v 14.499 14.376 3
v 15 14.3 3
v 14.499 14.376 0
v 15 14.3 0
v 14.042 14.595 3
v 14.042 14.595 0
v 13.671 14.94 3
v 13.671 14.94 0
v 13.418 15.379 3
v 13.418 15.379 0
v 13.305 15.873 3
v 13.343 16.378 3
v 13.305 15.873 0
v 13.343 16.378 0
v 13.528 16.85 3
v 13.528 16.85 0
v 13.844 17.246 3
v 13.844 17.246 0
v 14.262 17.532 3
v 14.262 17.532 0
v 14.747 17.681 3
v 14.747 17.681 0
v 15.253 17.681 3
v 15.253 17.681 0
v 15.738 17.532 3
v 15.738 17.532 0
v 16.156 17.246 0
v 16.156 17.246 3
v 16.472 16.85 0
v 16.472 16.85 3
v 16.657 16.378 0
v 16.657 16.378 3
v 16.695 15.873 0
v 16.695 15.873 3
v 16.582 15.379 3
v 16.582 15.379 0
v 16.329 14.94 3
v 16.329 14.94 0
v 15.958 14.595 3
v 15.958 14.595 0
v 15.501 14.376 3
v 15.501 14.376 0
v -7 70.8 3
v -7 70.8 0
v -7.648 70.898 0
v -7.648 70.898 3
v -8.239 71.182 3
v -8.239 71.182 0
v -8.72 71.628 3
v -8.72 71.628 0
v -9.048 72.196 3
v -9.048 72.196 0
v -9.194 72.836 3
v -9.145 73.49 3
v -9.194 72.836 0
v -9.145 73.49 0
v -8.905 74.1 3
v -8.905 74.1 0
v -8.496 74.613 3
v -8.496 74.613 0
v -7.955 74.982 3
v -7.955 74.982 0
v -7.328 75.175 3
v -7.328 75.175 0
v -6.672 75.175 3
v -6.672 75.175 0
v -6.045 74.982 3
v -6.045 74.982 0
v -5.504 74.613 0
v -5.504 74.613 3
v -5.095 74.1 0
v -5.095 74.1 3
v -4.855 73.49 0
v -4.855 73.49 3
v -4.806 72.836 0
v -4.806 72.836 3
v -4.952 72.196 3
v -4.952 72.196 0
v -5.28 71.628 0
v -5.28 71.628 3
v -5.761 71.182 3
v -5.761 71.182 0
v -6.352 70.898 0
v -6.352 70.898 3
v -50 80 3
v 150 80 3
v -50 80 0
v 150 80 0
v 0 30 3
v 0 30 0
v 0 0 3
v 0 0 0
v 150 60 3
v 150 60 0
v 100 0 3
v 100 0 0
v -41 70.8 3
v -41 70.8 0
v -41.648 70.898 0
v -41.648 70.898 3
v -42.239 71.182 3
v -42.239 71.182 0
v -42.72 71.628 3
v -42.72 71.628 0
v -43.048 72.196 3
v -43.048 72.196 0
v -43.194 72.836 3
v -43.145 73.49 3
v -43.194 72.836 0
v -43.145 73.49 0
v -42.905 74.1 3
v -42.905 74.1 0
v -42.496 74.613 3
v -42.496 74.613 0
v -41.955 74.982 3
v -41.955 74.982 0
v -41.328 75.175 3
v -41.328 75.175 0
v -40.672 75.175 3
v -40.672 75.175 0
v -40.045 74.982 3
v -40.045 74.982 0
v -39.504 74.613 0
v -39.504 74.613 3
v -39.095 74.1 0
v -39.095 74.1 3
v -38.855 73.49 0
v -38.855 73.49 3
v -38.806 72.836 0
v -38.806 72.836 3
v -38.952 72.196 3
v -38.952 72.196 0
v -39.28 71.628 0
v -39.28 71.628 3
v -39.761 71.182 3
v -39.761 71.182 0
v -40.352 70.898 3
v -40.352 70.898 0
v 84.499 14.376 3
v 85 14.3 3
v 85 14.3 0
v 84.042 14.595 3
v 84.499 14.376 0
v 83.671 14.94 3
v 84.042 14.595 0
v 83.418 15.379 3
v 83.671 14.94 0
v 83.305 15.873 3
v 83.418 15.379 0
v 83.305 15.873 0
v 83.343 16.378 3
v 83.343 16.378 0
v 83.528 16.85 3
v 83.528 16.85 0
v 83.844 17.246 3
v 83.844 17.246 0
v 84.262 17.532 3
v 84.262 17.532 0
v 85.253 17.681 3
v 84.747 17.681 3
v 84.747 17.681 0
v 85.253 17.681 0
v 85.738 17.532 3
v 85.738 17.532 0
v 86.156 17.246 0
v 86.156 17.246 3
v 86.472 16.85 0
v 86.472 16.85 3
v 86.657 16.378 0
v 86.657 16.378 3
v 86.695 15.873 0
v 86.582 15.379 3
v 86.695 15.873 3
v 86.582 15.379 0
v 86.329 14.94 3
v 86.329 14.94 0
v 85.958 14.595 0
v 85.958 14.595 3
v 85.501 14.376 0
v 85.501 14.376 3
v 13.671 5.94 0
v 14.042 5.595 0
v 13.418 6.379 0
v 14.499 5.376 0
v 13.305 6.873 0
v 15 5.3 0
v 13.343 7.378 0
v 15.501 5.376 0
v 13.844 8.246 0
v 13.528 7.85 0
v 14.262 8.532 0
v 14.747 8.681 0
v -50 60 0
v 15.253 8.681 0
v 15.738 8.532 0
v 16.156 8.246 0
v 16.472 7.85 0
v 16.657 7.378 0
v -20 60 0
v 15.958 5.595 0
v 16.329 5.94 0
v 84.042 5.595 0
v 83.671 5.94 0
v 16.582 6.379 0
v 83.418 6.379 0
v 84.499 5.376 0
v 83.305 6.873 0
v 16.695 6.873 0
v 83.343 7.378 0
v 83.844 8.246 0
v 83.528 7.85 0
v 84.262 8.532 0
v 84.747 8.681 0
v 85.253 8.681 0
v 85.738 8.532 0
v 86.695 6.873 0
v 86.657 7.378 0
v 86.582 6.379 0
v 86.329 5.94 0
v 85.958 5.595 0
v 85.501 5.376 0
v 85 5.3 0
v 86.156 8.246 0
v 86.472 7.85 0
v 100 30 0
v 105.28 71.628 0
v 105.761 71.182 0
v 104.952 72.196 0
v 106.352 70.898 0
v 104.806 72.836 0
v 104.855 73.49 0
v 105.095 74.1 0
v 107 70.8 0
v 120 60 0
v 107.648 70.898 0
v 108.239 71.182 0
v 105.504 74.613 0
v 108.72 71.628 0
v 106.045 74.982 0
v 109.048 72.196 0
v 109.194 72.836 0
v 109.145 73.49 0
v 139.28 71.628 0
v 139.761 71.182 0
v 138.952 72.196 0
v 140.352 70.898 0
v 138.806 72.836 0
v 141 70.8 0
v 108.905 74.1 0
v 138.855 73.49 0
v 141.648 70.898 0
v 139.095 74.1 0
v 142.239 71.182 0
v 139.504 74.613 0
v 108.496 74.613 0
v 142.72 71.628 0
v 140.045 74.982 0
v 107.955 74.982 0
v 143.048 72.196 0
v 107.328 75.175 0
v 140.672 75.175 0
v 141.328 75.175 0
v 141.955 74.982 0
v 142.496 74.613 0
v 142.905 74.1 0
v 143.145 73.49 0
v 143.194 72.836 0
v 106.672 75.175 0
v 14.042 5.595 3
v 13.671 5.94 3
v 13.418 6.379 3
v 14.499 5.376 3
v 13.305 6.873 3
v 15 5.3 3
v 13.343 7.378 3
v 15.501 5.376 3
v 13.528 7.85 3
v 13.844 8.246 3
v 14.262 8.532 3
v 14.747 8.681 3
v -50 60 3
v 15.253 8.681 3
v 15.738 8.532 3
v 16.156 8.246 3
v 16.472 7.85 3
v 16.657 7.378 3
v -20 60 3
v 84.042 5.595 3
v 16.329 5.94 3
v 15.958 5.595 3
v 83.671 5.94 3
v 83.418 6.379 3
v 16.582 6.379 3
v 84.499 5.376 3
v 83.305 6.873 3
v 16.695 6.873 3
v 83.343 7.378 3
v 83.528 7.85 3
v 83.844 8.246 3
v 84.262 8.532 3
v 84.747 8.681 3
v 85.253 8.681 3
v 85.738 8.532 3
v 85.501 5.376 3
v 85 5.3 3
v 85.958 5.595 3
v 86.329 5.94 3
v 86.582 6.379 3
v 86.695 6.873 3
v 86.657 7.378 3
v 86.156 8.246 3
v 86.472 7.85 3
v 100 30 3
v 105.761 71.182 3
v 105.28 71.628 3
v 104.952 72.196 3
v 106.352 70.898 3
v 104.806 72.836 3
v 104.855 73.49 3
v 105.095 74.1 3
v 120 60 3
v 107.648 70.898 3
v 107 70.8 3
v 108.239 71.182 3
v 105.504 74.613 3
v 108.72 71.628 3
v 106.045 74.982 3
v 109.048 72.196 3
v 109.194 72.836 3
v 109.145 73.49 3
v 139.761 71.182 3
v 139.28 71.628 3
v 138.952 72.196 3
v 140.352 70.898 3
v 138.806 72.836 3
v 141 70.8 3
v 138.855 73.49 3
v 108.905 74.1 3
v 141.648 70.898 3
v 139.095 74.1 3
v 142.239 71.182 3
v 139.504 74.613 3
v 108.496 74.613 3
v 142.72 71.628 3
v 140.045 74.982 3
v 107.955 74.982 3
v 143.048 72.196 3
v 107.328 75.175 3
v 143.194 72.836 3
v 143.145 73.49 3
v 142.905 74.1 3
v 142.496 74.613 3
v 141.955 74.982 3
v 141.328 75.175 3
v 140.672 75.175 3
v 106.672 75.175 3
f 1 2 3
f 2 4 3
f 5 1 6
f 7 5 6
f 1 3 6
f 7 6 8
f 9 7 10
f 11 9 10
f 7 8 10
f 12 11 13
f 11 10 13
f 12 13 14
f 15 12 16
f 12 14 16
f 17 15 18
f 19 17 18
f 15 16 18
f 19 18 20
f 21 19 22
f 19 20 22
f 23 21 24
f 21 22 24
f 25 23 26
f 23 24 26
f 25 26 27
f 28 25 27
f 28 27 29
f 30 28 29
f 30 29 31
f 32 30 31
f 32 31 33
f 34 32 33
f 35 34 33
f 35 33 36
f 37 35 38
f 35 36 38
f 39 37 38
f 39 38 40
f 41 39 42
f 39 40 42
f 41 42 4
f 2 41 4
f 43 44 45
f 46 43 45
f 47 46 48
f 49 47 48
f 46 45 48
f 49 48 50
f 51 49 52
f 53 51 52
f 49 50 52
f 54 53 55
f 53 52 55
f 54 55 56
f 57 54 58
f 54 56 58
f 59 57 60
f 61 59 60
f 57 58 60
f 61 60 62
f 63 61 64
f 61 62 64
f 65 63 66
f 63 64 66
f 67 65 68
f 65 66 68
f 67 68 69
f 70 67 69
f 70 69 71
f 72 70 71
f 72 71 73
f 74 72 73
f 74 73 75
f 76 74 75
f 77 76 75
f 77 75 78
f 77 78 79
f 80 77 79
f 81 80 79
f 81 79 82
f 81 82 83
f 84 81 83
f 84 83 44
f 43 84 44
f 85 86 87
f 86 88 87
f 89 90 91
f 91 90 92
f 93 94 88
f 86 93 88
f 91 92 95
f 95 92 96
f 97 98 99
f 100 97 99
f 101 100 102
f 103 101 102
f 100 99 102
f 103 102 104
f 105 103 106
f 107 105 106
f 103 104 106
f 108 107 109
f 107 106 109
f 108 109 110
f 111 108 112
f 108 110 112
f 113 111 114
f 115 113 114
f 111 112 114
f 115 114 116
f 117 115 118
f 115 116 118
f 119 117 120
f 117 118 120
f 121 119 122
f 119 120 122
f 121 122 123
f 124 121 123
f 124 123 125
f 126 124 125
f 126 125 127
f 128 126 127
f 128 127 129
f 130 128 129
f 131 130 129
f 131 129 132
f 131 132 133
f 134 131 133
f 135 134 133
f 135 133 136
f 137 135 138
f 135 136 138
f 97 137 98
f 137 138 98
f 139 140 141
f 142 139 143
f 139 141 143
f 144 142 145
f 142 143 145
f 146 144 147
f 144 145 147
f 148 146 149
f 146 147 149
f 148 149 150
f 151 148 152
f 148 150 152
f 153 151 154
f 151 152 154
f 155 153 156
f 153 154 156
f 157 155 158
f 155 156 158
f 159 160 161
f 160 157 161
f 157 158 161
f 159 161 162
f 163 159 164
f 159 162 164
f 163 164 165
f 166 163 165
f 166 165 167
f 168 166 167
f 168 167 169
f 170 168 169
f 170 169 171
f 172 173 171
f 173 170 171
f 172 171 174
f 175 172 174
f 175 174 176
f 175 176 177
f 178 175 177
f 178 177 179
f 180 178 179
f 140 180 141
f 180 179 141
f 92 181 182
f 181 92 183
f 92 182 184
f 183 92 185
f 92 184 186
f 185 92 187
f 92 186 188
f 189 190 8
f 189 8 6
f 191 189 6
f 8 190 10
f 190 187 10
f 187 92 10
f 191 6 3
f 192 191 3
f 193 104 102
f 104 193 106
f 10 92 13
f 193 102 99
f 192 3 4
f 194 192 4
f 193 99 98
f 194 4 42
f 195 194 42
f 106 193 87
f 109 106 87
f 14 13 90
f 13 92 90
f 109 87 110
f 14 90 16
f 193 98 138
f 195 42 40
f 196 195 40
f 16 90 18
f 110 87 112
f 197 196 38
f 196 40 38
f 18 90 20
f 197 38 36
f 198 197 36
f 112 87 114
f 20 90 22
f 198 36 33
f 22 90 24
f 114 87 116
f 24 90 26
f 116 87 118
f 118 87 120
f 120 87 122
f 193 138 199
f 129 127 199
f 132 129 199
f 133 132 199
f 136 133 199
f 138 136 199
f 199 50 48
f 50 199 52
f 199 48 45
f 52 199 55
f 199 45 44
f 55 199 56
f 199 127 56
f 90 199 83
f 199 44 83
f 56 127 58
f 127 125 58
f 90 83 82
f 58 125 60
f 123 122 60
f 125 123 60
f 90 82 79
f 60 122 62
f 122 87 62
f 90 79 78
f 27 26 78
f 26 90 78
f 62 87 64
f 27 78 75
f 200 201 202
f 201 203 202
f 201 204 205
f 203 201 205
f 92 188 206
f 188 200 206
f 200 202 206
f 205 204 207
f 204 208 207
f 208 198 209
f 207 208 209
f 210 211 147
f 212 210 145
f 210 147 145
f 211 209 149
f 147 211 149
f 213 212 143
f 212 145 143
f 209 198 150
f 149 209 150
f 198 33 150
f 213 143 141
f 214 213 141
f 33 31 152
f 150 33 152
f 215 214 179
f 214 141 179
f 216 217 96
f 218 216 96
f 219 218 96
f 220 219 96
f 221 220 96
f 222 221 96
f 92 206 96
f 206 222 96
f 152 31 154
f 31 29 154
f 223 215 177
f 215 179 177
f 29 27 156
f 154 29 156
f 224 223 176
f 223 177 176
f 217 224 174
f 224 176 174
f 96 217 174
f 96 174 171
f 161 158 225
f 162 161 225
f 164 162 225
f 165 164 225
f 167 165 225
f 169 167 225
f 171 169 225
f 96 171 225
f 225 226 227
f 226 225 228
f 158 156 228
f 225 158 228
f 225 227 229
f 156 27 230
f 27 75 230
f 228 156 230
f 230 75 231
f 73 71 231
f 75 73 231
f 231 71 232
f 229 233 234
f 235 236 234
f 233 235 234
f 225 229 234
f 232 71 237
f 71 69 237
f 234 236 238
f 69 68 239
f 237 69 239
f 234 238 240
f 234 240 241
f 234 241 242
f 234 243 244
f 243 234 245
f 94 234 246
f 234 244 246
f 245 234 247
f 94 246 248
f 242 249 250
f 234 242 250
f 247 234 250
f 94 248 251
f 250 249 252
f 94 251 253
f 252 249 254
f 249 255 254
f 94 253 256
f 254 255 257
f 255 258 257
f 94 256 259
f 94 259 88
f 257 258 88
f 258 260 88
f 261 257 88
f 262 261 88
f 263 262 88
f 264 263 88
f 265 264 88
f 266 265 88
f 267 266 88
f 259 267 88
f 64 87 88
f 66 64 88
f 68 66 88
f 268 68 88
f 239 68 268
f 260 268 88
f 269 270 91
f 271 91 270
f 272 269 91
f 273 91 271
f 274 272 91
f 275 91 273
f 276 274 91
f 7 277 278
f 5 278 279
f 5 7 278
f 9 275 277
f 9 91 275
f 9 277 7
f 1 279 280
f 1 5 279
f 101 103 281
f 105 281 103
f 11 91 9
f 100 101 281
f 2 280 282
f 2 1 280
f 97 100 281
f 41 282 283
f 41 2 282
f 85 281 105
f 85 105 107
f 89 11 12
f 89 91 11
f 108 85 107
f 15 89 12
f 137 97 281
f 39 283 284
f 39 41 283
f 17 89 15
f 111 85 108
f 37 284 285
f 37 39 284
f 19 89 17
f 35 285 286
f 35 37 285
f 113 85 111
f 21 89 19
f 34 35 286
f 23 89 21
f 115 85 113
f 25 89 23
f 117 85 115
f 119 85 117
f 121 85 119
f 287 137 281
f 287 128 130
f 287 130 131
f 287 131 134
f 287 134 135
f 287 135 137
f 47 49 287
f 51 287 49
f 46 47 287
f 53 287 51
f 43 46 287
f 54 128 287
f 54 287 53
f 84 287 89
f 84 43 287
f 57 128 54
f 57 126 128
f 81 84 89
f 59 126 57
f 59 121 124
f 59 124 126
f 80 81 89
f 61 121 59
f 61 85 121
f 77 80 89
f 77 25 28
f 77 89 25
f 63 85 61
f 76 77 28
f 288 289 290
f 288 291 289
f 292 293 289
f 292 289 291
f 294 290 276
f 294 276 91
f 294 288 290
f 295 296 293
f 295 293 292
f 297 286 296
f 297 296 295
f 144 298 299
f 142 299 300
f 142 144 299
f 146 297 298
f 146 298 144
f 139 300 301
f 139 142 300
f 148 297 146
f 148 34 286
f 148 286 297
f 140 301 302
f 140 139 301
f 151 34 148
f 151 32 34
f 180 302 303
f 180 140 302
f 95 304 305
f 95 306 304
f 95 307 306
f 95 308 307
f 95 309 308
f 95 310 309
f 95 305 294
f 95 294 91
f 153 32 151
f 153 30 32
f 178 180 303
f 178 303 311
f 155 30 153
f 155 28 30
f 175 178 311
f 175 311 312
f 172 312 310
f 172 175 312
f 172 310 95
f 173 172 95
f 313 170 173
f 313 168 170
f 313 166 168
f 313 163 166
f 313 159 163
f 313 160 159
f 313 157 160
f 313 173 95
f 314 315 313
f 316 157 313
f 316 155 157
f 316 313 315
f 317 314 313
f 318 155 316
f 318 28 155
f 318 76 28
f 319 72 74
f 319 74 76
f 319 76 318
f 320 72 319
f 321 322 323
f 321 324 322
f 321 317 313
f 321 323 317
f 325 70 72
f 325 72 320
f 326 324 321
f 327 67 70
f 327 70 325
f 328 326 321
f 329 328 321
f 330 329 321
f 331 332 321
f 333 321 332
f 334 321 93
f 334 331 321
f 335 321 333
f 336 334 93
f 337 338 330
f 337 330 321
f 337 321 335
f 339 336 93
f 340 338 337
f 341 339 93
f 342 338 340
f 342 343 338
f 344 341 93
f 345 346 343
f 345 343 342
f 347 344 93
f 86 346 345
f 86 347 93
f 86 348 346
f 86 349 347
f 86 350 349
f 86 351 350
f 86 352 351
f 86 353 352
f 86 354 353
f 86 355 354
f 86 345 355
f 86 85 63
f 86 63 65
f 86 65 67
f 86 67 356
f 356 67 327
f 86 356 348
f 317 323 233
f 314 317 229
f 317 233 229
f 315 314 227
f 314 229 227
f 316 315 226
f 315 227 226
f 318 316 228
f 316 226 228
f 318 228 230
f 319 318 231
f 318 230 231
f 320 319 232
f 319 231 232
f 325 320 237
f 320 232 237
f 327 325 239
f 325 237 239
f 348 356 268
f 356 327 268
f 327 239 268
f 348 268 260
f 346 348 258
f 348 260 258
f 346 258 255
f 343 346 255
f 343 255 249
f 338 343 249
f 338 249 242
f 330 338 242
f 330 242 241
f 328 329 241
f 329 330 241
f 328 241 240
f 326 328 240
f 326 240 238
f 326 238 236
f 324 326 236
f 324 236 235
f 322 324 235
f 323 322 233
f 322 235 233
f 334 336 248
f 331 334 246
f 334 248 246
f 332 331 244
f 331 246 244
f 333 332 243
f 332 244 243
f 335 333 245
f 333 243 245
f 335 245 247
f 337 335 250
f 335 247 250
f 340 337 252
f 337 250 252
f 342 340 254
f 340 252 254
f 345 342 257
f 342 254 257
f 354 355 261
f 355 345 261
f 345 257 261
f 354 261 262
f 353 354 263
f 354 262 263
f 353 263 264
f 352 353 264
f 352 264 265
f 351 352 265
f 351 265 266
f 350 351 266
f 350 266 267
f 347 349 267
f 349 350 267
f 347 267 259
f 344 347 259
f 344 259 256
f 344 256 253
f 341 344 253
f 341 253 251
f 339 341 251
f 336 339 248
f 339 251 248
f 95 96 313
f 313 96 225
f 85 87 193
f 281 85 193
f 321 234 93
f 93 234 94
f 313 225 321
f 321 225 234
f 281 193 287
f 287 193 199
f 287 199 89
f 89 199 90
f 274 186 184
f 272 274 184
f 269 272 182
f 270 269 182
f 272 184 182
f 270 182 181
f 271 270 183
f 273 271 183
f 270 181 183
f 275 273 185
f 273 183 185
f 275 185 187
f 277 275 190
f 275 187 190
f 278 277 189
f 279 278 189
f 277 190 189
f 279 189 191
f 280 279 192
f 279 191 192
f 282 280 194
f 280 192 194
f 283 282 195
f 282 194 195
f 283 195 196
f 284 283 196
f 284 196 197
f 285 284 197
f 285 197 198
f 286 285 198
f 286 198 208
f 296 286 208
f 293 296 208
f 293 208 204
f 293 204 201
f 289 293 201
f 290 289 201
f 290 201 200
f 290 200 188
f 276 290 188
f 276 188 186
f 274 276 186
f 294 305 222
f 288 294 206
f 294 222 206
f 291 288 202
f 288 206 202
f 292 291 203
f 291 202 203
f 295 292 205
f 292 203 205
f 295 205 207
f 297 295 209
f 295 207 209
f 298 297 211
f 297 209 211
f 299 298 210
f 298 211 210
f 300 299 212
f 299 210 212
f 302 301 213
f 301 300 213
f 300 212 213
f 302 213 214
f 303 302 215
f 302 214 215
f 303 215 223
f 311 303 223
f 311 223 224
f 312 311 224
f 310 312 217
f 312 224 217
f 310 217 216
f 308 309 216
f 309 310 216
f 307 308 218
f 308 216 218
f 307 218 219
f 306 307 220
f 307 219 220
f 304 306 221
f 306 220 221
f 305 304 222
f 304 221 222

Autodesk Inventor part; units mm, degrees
ref_plane "YZ Plane" through (0, 0, 0) normal (1, 0, 0) x (0, 1, 0)
ref_plane "XZ Plane" through (0, 0, 0) normal (0, 1, 0) x (-1, 0, 0)
ref_plane "XY Plane" through (0, 0, 0) normal (0, 0, 1) x (1, 0, 0)
sketch "Sketch1" plane through (0, 0, 0) normal (0, 1, 0) x (-1, 0, 0)
  point P0 (0, 0)
sketch "Sketch2" plane through (0, 0, 0) normal (0, 0, 1) x (1, 0, 0)
  line L0 (0, 0) -> (100, 0)
  line L1 (100, 0) -> (100, 30)
  line L2 (100, 30) -> (120, 60)
  line L3 (120, 60) -> (150, 60)
  line L4 (150, 60) -> (150, 80)
  line L5 (150, 80) -> (-50, 80)
  line L6 (-50, 80) -> (-50, 60)
  line L7 (0, 30) -> (0, 0)
  line L8 (-50, 60) -> (-20, 60)
  line L9 (-20, 60) -> (0, 30)
  dimension "d0" = 100
  dimension "d1" = 200
  dimension "d2" = 0
  dimension "d3" = 20
  dimension "d4" = 30
  dimension "d5" = 30
  dimension "d6" = 20
  dimension "d7" = 30
  dimension "d8" = 30
  dimension "d9" = 20
  dimension "d10" = 20
sketch "Sketch3" plane through (0, 0, 0) normal (0, 0, 1) x (1, 0, 0)
  point P0 (0, 0)
sketch "Sketch4" plane through (0, 0, 0) normal (0, 0, 1) x (1, 0, 0)
  point P0 (0, 0)
extrude "Extrusion1" add sketch "Sketch2" along normal blind 3
sketch "Sketch6" plane through (0, 0, 3) normal (0, 0, 1) x (1, 0, 0)
  point P0 (0, 0)
sketch "Sketch7" plane through (0, 0, 0) normal (0, 0, -1) x (-1, 0, 0)
  point P0 (0, 0)
sketch "Sketch8" plane through (0, 0, 3) normal (0, 0, 1) x (1, 0, 0)
  point P0 (0, 0)
sketch "Sketch9" plane through (0, 0, 3) normal (0, 0, 1) x (1, 0, 0)
  line L0 (-50, 80) -> (-50, 60) projected
  line L1 (150, 80) -> (-50, 80) projected
  line L2 (0, 30) -> (0, 0) projected
  line L3 (0, 0) -> (100, 0) projected
  point P0 (15, 16)
  point P1 (15, 7)
  dimension "d37" = 15
  dimension "d38" = 15
  dimension "d39" = 7
  dimension "d40" = 9
hole "Hole2" at (15, 7, 3) at (15, 16, 3) direction (0, 0, -1) diameter 3.4 end through all
sketch "Sketch11" plane through (0, 0, 3) normal (0, 0, 1) x (1, 0, 0)
  line L0 (100, 0) -> (100, 30) projected
  point P0 (0, 0)
sketch "Sketch12" plane through (0, 0, 3) normal (0, 0, 1) x (1, 0, 0)
  line L0 (-50, 80) -> (-50, 60) projected
  line L1 (150, 80) -> (-50, 80) projected
  point P0 (0, 0)
  point P1 (-41, 73)
  point P2 (-7, 73)
  dimension "d50" = 9
  dimension "d51" = 34
  dimension "d52" = 7
  dimension "d53" = 7
hole "Hole3" at (-41, 73, 3) at (-7, 73, 3) direction (0, 0, -1) diameter 4.4 end through all
ref_plane "Work Plane2" through (50, 0, 0) normal (-1, 0, 0) x (0, 0, 1)
mirror "Mirror1" about plane through (50, 0, 0) normal (-1, 0, 0) of "Hole2", "Hole3"
sketch "Sketch14" plane through (0, 0, 3) normal (0, 0, 1) x (1, 0, 0)
  point P0 (0, 0)
sketch "Sketch15" plane through (0, 0, 3) normal (0, 0, 1) x (1, 0, 0)
  point P0 (0, 0)
sketch "Sketch16" plane through (0, 0, 3) normal (0, 0, 1) x (1, 0, 0)
  point P0 (0, 0)
properties part number "plate"
